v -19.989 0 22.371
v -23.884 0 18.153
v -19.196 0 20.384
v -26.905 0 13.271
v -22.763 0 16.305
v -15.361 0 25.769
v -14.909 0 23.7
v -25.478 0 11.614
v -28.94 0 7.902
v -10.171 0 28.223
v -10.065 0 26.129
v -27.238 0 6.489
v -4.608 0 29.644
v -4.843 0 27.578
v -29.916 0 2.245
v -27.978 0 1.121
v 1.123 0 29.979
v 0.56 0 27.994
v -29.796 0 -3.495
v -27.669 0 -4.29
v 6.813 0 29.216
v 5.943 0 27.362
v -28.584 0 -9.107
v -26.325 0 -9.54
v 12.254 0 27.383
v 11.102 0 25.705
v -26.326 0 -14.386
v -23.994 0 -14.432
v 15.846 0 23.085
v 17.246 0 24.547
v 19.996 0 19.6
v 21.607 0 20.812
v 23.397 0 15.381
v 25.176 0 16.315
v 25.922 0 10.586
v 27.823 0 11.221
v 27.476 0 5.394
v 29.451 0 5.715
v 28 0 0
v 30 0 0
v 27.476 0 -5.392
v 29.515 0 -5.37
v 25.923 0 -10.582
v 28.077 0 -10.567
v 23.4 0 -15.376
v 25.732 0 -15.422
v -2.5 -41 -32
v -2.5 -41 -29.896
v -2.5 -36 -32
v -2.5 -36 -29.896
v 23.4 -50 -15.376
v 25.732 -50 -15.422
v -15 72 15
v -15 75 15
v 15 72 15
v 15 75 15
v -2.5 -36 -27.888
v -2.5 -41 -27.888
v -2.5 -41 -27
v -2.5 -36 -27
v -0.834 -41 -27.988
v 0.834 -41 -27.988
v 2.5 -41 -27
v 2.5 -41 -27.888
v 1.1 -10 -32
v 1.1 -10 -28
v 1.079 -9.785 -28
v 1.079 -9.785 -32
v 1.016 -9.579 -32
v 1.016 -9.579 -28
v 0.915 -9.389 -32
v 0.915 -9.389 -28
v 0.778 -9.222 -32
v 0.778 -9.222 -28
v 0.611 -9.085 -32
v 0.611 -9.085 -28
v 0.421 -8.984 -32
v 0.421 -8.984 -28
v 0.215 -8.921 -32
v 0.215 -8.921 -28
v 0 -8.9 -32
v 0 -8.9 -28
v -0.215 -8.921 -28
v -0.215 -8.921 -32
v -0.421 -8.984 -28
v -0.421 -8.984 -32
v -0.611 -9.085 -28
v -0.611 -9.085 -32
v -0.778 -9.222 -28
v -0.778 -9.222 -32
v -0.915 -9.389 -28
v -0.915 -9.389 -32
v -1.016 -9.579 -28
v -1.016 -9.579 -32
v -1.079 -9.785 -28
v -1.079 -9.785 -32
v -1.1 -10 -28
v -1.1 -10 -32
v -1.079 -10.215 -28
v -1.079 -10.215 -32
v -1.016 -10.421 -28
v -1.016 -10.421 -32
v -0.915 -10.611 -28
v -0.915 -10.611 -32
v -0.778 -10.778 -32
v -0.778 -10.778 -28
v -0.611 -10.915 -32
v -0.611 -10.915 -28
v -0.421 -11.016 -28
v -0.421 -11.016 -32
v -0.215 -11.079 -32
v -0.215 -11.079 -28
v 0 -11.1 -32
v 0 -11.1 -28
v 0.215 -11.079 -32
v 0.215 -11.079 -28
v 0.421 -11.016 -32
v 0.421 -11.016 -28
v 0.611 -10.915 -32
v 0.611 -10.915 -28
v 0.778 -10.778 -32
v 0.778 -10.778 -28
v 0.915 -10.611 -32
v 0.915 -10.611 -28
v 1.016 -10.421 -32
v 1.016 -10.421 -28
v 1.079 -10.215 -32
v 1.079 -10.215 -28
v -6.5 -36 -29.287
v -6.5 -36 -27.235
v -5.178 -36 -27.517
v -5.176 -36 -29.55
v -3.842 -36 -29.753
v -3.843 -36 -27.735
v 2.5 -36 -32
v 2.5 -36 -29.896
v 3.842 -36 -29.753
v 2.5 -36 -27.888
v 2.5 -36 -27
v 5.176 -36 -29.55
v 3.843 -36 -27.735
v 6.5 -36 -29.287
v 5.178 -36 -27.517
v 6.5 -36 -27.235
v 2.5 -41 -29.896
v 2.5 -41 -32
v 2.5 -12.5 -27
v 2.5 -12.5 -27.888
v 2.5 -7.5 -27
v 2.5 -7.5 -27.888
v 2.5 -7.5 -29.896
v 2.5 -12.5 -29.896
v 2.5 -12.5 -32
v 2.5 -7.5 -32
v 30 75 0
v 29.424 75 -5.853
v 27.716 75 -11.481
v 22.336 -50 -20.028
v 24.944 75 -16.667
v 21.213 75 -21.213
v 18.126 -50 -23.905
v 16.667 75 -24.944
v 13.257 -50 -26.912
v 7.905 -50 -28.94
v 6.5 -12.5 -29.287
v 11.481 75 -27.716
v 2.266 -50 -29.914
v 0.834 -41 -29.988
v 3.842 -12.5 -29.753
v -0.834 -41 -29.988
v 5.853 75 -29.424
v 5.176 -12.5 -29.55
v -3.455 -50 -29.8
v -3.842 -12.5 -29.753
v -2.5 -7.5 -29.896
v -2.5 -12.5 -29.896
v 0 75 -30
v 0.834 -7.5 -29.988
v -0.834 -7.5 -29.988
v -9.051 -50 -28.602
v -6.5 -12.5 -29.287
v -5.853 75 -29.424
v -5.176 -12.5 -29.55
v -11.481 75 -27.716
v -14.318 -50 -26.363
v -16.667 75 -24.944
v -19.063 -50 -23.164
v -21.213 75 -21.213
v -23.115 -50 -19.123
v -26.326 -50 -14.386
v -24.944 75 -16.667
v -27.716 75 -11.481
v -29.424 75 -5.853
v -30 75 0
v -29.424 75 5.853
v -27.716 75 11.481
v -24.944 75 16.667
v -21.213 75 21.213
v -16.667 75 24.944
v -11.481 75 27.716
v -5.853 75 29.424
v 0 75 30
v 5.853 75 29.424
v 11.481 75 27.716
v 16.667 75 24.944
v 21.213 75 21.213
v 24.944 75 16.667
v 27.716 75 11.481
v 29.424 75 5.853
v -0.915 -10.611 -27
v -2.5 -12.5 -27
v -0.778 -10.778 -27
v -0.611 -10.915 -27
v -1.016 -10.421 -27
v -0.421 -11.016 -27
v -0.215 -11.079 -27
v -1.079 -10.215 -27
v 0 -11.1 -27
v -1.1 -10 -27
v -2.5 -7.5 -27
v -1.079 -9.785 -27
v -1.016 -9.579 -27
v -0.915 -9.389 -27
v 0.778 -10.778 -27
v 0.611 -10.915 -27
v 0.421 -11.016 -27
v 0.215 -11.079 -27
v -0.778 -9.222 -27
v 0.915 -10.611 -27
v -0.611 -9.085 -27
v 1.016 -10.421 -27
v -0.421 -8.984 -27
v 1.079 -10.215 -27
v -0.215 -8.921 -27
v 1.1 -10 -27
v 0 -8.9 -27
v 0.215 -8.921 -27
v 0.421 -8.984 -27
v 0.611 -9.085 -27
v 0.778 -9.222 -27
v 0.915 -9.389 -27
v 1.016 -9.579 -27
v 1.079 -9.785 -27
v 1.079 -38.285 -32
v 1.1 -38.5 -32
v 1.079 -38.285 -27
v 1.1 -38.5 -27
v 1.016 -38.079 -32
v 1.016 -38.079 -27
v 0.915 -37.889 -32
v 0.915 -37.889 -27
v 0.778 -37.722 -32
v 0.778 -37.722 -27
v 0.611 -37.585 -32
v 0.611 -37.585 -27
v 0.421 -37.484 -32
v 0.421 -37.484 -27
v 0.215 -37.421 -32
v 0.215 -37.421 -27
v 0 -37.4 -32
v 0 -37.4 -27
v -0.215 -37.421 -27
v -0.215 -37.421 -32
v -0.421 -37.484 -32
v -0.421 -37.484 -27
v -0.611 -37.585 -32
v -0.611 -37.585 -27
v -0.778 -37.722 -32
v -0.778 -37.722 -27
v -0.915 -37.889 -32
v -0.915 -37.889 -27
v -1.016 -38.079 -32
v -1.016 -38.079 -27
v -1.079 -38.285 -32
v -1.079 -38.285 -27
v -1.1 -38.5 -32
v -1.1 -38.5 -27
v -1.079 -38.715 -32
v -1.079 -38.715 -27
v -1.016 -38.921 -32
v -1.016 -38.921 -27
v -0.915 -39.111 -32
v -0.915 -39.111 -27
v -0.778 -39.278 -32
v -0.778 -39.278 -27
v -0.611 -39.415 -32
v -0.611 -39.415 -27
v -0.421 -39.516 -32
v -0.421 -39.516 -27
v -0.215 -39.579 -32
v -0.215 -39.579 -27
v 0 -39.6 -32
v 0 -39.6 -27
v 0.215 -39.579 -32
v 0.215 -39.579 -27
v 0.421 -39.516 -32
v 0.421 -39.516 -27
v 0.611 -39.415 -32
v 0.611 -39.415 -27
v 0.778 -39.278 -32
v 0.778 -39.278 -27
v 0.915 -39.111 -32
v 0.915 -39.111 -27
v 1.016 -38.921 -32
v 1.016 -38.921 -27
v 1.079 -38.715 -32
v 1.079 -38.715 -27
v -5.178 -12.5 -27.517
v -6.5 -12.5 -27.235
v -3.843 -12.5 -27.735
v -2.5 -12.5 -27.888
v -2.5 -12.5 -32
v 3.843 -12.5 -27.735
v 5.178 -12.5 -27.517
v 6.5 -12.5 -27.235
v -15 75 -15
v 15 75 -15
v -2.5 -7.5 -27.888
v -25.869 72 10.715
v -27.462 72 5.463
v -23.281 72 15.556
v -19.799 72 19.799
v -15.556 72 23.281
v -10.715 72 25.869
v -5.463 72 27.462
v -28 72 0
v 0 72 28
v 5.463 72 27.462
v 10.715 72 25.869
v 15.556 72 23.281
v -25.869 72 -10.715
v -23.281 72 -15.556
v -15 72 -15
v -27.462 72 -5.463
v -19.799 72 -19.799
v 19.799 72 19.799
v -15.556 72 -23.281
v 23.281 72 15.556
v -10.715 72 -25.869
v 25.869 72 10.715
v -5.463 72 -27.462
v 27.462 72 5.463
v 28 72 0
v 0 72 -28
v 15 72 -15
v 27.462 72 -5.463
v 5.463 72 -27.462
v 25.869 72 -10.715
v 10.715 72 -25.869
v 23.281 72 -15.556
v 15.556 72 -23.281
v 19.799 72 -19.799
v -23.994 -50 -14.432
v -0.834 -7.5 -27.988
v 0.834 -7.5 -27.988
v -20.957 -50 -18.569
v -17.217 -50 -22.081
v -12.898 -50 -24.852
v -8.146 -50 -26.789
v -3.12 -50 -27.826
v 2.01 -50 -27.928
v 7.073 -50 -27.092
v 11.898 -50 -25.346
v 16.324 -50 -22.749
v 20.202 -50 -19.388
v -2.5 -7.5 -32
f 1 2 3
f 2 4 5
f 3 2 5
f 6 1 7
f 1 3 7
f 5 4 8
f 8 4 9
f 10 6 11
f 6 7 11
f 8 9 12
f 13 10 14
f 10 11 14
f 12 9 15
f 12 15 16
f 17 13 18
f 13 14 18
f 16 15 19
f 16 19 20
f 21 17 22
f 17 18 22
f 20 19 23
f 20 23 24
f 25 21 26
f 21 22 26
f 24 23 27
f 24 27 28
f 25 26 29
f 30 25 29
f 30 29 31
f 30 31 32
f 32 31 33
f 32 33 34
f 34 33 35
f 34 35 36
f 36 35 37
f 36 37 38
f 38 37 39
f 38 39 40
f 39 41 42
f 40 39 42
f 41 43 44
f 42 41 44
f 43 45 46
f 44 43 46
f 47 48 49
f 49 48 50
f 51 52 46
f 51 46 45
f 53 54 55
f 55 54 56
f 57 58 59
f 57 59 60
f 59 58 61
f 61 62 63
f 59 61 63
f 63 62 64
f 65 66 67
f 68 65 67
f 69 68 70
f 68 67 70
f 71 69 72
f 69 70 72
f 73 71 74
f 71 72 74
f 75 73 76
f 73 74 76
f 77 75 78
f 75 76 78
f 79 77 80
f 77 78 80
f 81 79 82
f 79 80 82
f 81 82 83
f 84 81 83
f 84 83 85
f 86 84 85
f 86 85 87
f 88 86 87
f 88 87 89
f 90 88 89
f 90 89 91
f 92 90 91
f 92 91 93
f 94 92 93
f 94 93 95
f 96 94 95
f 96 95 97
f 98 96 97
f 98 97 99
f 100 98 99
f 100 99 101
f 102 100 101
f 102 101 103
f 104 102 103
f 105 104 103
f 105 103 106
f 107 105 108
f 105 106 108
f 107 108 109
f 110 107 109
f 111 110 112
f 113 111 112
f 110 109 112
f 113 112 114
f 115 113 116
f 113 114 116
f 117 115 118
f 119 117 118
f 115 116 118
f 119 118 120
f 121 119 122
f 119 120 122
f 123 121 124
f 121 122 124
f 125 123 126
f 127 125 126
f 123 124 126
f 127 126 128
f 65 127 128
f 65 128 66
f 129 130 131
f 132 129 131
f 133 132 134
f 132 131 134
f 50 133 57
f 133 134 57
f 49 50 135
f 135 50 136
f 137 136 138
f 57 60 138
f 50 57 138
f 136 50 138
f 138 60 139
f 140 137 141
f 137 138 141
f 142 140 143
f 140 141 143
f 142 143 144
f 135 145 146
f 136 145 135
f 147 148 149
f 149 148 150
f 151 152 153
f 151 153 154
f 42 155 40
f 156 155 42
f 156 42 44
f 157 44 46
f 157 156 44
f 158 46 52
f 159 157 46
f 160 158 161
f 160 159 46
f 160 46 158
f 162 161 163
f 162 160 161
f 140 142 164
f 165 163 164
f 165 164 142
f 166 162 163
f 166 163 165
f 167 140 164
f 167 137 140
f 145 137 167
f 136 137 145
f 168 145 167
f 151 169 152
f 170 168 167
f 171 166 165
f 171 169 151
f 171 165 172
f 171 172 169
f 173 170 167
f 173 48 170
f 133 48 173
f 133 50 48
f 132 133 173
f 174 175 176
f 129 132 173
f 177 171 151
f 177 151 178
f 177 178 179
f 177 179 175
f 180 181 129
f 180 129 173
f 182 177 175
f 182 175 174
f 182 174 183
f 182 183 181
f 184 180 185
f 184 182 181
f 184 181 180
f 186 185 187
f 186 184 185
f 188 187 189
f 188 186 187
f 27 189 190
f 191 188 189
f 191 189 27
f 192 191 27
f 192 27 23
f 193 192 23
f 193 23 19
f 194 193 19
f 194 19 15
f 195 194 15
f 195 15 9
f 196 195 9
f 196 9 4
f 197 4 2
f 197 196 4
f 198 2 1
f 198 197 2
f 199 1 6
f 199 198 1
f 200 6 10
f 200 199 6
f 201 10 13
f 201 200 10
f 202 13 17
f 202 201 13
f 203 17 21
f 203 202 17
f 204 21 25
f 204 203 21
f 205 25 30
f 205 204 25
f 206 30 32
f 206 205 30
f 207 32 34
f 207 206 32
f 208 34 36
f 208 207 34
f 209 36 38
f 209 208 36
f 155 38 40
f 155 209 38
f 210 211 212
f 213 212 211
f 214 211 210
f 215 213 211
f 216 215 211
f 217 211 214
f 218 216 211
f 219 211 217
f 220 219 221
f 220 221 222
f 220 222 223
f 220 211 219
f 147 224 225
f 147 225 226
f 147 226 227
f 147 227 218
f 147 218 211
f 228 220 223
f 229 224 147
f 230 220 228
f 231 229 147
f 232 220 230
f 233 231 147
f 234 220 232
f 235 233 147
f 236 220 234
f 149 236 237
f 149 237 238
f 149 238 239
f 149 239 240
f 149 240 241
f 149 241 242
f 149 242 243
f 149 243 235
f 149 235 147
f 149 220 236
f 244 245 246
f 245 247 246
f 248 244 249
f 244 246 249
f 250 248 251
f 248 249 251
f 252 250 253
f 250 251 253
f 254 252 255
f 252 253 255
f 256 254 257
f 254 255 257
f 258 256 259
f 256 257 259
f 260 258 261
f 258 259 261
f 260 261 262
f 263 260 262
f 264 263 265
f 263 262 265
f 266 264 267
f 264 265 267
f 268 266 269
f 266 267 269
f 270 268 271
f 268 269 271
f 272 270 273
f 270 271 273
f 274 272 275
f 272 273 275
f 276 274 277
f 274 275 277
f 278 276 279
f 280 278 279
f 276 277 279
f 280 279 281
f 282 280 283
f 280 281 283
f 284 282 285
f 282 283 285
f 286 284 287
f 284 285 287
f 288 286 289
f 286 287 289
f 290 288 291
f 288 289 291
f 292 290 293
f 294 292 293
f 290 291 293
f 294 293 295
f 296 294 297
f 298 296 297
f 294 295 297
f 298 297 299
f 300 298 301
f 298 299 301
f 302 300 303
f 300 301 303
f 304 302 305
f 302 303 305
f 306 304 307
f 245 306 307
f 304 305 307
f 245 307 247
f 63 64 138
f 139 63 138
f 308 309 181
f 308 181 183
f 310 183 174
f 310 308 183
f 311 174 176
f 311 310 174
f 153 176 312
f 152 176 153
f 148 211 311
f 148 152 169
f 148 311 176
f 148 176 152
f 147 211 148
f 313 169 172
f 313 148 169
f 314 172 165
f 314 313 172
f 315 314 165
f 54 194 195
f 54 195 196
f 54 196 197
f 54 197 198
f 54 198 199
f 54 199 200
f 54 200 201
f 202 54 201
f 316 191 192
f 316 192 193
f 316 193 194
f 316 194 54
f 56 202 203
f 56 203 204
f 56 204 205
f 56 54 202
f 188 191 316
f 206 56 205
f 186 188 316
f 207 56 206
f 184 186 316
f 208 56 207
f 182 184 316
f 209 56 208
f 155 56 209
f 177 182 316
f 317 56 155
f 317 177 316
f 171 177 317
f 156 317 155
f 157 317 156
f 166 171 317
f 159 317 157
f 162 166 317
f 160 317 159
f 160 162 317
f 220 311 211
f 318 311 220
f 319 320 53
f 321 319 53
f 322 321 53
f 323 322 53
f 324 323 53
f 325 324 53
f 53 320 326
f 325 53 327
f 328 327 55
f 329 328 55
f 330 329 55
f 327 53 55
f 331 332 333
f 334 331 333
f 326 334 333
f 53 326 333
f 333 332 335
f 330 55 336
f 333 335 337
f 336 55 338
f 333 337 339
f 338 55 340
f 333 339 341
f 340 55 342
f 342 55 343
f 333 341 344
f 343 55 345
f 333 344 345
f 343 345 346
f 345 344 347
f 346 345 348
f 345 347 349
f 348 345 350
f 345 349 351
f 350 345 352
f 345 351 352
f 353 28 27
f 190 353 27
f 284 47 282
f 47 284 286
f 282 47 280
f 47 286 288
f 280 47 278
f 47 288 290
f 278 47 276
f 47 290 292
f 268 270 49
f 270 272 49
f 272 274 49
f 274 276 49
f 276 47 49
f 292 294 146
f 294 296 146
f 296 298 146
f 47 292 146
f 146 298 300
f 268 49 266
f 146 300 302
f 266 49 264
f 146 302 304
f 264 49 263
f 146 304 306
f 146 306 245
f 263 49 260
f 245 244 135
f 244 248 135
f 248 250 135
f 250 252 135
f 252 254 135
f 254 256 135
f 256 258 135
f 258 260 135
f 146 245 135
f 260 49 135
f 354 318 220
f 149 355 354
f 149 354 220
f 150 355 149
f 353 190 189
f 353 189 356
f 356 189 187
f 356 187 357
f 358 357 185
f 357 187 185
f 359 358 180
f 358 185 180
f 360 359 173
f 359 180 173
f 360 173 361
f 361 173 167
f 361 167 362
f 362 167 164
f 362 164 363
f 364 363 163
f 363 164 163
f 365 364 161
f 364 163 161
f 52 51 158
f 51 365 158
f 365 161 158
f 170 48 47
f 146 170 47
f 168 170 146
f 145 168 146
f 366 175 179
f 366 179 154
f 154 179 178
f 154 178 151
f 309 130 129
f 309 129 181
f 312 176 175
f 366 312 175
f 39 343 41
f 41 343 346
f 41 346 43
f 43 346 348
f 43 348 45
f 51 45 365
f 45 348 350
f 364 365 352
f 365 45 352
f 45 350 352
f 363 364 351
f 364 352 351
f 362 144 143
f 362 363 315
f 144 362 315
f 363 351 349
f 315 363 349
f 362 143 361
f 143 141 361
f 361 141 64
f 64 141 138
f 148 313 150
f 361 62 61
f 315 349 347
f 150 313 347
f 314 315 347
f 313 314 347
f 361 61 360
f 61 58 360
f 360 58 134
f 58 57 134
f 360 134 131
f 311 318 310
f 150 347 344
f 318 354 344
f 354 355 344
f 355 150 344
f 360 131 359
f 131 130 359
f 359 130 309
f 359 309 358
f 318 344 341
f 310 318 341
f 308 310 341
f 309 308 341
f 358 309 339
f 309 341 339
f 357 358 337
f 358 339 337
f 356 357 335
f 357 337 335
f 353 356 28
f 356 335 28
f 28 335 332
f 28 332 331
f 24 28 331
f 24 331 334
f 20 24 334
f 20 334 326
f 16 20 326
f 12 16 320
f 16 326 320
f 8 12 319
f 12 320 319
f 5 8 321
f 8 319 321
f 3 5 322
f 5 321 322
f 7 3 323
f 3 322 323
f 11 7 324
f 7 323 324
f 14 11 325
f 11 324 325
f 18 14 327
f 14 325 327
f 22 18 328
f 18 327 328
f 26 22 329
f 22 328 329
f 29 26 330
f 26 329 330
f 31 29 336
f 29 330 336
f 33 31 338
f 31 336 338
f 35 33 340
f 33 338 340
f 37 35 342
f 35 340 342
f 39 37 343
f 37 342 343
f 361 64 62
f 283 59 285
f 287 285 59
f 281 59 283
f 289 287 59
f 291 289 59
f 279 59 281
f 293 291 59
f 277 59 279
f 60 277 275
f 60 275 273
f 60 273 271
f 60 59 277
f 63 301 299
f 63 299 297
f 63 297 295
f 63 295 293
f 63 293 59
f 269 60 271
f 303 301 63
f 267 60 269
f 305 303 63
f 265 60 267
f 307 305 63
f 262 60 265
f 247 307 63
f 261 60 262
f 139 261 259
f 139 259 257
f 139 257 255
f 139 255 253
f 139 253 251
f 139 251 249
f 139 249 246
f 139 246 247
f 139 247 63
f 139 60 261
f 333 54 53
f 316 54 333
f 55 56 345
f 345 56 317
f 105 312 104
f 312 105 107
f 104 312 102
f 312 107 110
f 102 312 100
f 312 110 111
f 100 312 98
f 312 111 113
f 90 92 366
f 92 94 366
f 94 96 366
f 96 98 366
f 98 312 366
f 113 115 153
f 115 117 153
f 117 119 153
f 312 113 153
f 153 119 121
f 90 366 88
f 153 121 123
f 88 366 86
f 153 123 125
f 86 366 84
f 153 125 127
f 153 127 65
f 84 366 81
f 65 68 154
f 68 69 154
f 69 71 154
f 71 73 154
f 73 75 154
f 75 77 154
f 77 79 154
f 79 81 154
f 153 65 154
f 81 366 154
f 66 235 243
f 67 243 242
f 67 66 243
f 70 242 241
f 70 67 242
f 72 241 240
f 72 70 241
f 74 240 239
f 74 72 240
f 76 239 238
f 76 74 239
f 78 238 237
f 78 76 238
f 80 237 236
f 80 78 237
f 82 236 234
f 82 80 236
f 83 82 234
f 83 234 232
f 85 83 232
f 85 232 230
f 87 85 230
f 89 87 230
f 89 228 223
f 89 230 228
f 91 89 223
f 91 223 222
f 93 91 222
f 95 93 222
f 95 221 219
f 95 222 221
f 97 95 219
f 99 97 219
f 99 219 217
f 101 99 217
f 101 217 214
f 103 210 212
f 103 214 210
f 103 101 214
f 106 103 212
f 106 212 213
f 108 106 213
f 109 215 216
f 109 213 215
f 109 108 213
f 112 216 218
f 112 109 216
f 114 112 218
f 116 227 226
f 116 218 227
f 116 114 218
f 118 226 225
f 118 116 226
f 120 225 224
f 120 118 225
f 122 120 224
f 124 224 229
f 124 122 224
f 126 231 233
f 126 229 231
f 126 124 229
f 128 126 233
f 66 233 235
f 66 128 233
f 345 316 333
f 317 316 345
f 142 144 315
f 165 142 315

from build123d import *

# Parameters (mm, degrees)
EXTRUDE_1_DEPTH           = 75
EXTRUDE_1_DEPTH_BACK      = 50
SKETCH_1_R                = 30
SKETCH_10_W               = 30
SKETCH_10_H               = 30
CUT_EXTRUDE_8_DEPTH       = 45.1
CUT_EXTRUDE_9_DEPTH       = 10
CUT_EXTRUDE_9_DEPTH_BACK  = 113
SKETCH_10_2_W             = 30
SKETCH_10_2_H             = 30
CUT_EXTRUDE_10_DEPTH      = 54
CUT_EXTRUDE_11_DEPTH      = 72
CUT_EXTRUDE_11_DEPTH_BACK = 55
SKETCH_12_R               = 28
SKETCH_13_W               = 13
SKETCH_13_H               = 23.5
CUT_EXTRUDE_12_DEPTH      = 54
EXTRUDE_2_DEPTH           = 1
EXTRUDE_2_DEPTH_BACK      = 4
SKETCH_14_W               = 5
SKETCH_14_H               = 5
CUT_EXTRUDE_13_DEPTH      = 4
CUT_EXTRUDE_13_DEPTH_BACK = 5
SKETCH_15_R               = 1.1


with BuildPart() as part:
    # 草圖1 → 填料-伸長1 (new, two sides: drawn at the far end of the back side and taken through both)
    with BuildSketch(Plane(origin=(0, 0, 0), x_dir=(1, 0, 0), z_dir=(0, 1, 0)).offset(-EXTRUDE_1_DEPTH_BACK)):
        Circle(SKETCH_1_R)
    extrude(amount=EXTRUDE_1_DEPTH + EXTRUDE_1_DEPTH_BACK)

    # 草圖10 → 除料-伸長8 (cut)
    with BuildSketch(Plane(origin=(0, 75, 0), x_dir=(1, 0, 0), z_dir=(0, 1, 0))):
        Rectangle(SKETCH_10_W, SKETCH_10_H)
    extrude(amount=-CUT_EXTRUDE_8_DEPTH, mode=Mode.SUBTRACT)

    # 草圖10<2> → 除料-伸長9 (cut, two sides: drawn at the far end of the back side and taken through both)
    with BuildSketch(Plane(origin=(0, 75, 0), x_dir=(1, 0, 0), z_dir=(0, 1, 0)).offset(-CUT_EXTRUDE_9_DEPTH_BACK)):
        Rectangle(SKETCH_10_2_W, SKETCH_10_2_H)
    extrude(amount=CUT_EXTRUDE_9_DEPTH + CUT_EXTRUDE_9_DEPTH_BACK, mode=Mode.SUBTRACT)

    # 草圖11 → 除料-伸長10 (cut)
    with BuildSketch(Plane(origin=(0, 0, 0), x_dir=(1, 0, 0), z_dir=(0, 1, 0))):
        with BuildLine():
            Line((25.732316415, 15.422317981), (-26.32585788, 14.385729278))
            ThreePointArc((-26.32585788, 14.385729278), (0.597245261, -29.994054379), (25.732316415, 15.422317981))
        make_face()
    extrude(amount=-CUT_EXTRUDE_10_DEPTH, mode=Mode.SUBTRACT)

    # 草圖12 → 除料-伸長11 (cut, two sides: drawn at the far end of the back side and taken through both)
    with BuildSketch(Plane(origin=(0, 0, 0), x_dir=(1, 0, 0), z_dir=(0, 1, 0)).offset(-CUT_EXTRUDE_11_DEPTH_BACK)):
        Circle(SKETCH_12_R)
    extrude(amount=CUT_EXTRUDE_11_DEPTH + CUT_EXTRUDE_11_DEPTH_BACK, mode=Mode.SUBTRACT)

    # 草圖13 → 除料-伸長12 (cut)
    with BuildSketch(Plane.XY):
        with Locations((0, -24.25)):
            Rectangle(SKETCH_13_W, SKETCH_13_H)
    extrude(amount=-CUT_EXTRUDE_12_DEPTH, mode=Mode.SUBTRACT)

    # 草圖14 → 填料-伸長2 (add, two sides: drawn at the far end of the back side and taken through both)
    with BuildSketch(Plane.XY.offset(-28).offset(-EXTRUDE_2_DEPTH_BACK)):
        with Locations((0, -38.5)):
            Rectangle(SKETCH_14_W, SKETCH_14_H)
        with Locations((0, -10)):
            Rectangle(SKETCH_14_W, SKETCH_14_H)
    extrude(amount=EXTRUDE_2_DEPTH + EXTRUDE_2_DEPTH_BACK)

    # 草圖15 → 除料-伸長13 (cut, two sides: drawn at the far end of the back side and taken through both)
    with BuildSketch(Plane.XY.offset(-28).offset(-CUT_EXTRUDE_13_DEPTH_BACK)):
        with Locations((0, -10)):
            Circle(SKETCH_15_R)
        with Locations((0, -38.5)):
            Circle(SKETCH_15_R)
    extrude(amount=CUT_EXTRUDE_13_DEPTH + CUT_EXTRUDE_13_DEPTH_BACK, mode=Mode.SUBTRACT)


solid = part.part
